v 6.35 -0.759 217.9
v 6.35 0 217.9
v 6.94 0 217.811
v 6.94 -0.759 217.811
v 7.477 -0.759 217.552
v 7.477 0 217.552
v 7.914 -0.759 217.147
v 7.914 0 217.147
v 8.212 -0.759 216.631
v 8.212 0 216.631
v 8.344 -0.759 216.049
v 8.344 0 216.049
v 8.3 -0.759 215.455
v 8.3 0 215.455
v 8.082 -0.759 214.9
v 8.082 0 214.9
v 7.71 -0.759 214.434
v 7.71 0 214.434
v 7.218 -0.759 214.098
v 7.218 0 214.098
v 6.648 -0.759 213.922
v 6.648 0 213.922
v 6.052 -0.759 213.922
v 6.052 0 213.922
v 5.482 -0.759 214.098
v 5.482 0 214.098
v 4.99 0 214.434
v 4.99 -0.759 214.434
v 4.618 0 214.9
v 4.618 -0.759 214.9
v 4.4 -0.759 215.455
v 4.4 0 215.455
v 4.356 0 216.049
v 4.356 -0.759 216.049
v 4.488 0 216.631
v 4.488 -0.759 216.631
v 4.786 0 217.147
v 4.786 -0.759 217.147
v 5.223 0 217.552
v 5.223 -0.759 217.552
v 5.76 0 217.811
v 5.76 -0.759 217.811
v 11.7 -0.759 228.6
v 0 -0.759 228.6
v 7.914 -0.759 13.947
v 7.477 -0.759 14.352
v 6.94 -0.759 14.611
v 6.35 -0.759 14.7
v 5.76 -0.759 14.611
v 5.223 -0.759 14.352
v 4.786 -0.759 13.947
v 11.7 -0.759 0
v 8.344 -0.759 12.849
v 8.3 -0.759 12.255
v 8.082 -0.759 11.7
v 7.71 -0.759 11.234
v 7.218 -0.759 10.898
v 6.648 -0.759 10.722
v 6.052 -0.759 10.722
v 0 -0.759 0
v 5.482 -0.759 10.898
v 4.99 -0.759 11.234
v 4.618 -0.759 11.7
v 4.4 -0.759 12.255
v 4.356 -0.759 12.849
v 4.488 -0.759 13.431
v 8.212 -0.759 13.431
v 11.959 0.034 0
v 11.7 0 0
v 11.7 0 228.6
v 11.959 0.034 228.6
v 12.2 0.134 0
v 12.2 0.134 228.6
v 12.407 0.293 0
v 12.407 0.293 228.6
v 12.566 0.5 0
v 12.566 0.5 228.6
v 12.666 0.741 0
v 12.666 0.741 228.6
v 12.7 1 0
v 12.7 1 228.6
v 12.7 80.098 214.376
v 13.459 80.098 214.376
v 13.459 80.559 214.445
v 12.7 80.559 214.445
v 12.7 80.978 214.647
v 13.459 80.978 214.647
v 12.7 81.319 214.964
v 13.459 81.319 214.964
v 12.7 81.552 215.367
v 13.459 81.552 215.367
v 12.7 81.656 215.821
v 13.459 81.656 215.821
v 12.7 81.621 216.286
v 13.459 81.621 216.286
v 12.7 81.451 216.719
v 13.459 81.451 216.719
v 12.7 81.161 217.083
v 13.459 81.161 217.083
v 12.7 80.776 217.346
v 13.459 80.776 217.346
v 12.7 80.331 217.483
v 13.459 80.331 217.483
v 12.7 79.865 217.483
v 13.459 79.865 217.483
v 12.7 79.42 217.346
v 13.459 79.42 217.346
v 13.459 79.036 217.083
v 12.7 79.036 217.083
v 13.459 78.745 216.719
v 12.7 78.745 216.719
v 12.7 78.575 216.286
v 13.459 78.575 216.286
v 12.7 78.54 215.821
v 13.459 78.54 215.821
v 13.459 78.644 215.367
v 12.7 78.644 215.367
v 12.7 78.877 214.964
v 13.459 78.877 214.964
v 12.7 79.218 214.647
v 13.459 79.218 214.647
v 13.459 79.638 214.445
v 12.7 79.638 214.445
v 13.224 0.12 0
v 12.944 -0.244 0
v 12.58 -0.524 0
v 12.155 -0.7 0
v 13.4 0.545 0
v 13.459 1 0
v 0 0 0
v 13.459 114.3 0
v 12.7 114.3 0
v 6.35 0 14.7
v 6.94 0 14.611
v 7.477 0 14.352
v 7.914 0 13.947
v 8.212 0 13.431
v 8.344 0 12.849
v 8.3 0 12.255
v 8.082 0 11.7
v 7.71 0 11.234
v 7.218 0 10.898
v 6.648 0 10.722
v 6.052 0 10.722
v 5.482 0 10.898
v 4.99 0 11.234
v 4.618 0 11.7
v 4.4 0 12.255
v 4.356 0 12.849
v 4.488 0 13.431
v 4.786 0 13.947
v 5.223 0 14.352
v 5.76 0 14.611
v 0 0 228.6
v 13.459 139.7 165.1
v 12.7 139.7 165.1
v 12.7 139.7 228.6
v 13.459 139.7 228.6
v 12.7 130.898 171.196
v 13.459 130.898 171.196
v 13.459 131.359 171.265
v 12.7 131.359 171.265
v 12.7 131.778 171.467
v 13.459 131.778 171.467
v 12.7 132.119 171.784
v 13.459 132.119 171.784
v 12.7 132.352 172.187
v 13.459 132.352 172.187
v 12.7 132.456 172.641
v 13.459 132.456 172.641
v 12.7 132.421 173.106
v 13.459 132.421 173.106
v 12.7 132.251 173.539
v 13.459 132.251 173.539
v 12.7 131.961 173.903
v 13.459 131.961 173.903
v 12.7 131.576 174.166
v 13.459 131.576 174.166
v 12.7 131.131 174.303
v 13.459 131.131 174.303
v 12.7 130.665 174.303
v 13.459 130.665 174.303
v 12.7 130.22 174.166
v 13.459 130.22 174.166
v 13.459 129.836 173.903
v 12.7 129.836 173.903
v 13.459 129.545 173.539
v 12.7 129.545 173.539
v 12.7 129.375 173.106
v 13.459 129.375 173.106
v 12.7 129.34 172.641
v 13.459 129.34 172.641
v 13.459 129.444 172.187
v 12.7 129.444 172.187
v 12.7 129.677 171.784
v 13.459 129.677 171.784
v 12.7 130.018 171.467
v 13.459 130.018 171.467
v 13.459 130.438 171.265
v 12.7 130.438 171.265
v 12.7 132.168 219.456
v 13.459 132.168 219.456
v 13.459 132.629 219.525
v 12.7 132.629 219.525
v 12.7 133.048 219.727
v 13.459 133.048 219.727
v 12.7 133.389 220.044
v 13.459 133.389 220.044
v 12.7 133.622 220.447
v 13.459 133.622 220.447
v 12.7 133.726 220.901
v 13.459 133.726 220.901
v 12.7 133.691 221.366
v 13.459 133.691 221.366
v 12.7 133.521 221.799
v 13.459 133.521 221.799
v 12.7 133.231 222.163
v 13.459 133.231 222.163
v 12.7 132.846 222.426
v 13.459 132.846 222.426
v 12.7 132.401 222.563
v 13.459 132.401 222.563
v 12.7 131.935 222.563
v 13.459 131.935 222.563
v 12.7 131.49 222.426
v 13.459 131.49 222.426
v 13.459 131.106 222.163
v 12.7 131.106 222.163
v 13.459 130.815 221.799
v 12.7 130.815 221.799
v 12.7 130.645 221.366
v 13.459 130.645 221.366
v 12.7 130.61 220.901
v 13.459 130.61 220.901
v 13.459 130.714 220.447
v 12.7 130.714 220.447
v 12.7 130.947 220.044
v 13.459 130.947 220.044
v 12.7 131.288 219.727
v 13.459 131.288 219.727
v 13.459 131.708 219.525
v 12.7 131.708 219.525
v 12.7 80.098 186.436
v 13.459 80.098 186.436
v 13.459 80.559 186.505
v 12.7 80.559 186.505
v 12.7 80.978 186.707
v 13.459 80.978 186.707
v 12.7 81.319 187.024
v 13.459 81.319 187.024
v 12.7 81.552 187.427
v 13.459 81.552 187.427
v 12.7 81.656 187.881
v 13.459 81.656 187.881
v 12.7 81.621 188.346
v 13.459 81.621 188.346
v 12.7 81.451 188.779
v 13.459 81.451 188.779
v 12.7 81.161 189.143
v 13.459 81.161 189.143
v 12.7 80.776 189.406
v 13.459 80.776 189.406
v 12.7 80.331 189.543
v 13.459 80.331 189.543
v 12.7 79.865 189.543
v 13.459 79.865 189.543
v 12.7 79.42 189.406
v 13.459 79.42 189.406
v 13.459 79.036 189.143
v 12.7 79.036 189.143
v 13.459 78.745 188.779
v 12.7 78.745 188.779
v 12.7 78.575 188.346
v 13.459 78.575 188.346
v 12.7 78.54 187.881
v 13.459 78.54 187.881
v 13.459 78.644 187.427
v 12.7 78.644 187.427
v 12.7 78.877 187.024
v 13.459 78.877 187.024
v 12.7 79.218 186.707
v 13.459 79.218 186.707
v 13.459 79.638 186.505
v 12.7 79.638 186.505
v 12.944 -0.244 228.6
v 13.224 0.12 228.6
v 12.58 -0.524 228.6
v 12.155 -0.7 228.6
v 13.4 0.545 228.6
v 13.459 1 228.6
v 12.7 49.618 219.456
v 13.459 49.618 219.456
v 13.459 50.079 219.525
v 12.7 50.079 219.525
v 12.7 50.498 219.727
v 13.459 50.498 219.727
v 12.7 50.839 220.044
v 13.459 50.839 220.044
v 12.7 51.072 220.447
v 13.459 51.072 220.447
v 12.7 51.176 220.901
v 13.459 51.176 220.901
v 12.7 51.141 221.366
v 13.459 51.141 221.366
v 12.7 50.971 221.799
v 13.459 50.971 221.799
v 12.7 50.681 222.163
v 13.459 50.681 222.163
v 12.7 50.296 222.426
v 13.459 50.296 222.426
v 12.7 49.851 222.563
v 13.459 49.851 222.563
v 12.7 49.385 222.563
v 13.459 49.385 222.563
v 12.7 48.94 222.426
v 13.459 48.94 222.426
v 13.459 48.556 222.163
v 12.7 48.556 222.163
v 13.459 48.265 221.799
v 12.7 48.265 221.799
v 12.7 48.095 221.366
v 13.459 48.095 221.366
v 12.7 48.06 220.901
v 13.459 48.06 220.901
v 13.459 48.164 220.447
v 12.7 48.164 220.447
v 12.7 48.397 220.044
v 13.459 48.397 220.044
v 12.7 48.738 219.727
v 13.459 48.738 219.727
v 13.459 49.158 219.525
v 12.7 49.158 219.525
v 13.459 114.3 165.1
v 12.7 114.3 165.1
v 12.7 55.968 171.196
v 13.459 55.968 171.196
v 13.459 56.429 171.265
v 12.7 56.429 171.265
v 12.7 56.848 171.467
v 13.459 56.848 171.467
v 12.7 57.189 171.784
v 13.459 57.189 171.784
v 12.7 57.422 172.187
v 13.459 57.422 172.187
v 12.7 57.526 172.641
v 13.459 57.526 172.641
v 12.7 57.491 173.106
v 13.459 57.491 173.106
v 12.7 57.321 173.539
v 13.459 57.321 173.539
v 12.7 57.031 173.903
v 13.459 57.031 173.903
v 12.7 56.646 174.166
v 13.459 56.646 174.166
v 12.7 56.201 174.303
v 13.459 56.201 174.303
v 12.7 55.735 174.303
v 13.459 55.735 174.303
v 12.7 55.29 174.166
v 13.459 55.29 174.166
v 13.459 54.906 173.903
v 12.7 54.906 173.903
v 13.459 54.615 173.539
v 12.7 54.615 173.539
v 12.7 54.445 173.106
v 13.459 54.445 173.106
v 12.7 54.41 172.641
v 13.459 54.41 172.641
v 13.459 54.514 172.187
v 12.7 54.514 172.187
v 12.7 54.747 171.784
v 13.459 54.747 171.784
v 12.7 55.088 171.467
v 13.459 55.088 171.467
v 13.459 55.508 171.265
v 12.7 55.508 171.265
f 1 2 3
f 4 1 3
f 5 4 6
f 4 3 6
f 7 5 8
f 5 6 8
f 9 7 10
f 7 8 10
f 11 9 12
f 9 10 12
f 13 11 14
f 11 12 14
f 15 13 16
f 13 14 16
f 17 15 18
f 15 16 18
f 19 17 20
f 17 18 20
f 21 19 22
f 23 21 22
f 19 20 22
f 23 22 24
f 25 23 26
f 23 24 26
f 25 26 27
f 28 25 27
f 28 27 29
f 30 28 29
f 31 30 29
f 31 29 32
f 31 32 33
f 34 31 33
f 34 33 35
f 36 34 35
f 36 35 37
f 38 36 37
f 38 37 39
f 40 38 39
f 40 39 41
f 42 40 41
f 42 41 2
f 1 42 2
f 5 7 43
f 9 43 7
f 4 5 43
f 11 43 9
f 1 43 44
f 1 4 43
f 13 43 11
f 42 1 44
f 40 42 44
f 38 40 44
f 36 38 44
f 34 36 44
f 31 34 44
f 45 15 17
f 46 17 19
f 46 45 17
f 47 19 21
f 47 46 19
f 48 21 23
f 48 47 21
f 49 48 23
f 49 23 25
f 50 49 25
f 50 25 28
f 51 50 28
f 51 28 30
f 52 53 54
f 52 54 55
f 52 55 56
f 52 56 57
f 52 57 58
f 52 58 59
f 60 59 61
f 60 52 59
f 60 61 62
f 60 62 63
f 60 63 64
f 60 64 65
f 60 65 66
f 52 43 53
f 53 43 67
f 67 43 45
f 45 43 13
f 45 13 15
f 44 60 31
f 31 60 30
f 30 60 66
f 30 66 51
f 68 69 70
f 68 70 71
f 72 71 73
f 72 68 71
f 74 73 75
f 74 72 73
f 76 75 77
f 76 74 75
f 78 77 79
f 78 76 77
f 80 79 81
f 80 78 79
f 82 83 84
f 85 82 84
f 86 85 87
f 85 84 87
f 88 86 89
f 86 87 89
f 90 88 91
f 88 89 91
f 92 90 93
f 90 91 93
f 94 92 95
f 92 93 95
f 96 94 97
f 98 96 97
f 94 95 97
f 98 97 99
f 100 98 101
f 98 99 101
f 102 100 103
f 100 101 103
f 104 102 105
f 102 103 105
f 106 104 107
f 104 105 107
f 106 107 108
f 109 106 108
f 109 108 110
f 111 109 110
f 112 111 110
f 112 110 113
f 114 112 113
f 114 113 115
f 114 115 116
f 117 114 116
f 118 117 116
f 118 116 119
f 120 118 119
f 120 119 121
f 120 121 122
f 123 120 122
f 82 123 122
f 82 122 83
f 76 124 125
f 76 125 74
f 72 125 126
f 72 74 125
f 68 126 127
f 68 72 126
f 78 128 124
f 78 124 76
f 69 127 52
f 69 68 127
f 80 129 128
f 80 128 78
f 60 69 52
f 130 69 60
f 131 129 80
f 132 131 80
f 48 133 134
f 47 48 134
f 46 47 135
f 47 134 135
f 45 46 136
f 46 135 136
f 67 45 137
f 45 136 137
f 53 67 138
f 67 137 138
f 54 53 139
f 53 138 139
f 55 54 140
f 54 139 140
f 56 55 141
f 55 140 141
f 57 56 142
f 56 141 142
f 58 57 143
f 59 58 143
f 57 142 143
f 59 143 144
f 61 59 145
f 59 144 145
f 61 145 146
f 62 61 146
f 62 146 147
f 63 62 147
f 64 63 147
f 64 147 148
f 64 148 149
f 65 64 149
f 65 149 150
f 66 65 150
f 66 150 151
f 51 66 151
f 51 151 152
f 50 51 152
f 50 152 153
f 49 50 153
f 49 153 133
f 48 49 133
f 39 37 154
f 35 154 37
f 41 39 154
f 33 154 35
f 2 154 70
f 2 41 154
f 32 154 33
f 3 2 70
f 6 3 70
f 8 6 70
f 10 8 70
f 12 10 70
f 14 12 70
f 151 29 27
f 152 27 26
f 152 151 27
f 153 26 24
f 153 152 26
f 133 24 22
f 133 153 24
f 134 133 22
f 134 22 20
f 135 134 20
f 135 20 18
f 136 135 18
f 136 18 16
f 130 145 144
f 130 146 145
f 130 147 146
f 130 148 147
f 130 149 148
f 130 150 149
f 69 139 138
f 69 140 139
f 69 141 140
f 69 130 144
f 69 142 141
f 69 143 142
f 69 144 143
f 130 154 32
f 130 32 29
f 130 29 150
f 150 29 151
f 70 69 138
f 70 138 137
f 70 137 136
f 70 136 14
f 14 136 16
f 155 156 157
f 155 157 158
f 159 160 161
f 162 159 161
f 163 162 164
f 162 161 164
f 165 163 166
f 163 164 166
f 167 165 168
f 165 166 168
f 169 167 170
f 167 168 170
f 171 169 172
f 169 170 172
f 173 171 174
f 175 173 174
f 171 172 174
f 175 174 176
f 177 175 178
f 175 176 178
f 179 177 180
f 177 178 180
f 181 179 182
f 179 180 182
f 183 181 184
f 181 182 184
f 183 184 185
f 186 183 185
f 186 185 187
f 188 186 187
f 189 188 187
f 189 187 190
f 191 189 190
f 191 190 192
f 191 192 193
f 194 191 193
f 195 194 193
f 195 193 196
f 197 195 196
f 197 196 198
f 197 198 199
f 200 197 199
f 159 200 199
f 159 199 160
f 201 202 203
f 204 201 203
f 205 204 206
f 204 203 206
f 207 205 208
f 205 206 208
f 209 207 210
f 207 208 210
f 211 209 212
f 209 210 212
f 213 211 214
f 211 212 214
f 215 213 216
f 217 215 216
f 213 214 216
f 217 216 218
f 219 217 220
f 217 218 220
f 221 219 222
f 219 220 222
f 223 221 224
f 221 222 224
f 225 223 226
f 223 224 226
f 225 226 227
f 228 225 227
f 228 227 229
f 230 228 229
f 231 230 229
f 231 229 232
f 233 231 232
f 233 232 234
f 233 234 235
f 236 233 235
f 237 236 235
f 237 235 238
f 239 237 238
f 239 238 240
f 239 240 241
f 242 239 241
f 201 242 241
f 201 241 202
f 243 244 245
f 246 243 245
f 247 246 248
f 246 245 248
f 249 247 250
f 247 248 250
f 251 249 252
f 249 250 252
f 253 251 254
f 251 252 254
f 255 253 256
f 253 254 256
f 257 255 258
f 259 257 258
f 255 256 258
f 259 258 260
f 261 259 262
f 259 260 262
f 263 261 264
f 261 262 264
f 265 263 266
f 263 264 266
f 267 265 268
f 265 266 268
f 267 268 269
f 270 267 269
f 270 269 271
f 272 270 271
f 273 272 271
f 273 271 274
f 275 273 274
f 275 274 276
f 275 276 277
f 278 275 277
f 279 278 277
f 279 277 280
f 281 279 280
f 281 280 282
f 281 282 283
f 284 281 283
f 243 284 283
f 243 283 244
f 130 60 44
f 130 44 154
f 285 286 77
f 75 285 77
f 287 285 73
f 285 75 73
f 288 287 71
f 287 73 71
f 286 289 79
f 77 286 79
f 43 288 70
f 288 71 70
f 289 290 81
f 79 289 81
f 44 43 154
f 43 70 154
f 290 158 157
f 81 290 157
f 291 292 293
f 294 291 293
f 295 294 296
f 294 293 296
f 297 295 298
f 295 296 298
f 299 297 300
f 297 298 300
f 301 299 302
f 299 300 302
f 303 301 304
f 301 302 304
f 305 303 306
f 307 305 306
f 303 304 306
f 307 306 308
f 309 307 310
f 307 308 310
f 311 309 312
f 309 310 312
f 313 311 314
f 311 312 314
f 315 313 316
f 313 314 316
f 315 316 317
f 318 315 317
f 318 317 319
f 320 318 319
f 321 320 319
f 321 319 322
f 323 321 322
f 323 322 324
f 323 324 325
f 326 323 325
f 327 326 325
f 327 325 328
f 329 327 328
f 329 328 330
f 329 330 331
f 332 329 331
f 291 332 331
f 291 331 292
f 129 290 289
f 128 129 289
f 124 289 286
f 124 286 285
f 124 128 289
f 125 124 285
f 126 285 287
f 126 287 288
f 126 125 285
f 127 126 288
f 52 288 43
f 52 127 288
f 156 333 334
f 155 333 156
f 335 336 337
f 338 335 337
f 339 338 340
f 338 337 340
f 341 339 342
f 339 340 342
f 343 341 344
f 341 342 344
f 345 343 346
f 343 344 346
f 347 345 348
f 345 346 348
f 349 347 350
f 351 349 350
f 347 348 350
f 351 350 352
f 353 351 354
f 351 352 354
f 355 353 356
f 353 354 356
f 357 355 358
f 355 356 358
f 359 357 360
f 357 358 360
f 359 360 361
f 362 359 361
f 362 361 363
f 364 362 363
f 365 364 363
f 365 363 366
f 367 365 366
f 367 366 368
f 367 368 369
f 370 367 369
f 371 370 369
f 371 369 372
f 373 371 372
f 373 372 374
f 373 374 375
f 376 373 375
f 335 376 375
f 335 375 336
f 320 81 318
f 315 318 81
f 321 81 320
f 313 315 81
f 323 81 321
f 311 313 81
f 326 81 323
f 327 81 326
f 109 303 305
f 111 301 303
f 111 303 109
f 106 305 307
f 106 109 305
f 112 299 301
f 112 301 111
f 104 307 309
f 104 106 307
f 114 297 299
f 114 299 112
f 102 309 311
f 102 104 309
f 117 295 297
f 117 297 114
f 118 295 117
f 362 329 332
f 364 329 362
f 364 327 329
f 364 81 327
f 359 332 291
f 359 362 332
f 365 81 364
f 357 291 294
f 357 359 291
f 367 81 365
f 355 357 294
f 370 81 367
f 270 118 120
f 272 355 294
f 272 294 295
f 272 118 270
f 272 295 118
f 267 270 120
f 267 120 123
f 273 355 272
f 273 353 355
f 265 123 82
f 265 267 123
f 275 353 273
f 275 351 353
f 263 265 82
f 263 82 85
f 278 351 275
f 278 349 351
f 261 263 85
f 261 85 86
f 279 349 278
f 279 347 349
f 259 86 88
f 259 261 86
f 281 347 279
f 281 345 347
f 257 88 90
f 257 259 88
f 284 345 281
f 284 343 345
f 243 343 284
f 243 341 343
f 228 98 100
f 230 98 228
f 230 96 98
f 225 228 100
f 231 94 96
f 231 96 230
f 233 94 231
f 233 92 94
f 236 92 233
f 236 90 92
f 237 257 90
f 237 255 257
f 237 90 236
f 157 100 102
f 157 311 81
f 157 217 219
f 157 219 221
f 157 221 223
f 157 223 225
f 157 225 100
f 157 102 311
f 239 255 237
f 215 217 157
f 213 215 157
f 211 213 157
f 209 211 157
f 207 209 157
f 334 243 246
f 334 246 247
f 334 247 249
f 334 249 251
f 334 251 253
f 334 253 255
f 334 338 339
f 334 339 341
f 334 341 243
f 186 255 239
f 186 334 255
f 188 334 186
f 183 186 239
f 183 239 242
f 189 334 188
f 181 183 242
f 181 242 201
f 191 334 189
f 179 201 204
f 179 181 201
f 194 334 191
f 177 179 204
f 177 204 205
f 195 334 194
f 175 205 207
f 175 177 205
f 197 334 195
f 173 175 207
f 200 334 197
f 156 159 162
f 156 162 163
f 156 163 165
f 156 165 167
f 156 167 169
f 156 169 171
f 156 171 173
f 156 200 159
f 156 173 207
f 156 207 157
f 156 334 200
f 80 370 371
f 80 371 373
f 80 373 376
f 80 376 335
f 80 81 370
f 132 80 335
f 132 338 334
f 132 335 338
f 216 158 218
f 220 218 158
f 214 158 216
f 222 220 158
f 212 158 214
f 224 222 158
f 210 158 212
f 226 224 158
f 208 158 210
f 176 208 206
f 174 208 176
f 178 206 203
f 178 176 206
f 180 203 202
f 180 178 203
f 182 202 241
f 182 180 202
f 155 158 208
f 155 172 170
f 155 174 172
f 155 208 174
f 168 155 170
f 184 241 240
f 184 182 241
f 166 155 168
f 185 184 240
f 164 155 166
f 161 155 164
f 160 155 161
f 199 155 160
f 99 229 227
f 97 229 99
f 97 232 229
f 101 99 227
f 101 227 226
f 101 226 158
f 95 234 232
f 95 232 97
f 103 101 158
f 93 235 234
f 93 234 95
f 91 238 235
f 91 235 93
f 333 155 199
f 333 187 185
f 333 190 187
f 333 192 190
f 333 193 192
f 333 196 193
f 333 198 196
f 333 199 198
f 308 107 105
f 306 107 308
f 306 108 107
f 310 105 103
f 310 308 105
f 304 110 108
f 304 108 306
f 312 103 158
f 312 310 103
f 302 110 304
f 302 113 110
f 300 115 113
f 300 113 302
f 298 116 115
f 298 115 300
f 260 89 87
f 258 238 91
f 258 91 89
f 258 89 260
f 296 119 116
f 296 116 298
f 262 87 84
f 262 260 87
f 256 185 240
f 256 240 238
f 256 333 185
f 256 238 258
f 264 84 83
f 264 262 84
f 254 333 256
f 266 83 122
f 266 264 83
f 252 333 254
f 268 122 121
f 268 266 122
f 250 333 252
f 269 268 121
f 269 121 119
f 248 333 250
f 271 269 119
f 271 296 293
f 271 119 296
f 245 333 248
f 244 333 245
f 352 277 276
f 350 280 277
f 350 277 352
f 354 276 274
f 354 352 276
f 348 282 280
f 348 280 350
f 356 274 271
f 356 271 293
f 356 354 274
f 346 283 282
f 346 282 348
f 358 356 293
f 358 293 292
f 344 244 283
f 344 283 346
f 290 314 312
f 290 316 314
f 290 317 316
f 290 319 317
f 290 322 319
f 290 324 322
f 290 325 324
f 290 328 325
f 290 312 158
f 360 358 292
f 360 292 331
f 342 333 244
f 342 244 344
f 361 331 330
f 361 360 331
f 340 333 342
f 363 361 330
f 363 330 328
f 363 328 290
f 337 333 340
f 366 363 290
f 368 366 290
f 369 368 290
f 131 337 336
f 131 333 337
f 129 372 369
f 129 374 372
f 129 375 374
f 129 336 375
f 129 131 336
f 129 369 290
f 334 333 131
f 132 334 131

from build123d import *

# Parameters (mm, degrees)
BASE_FLANGE1_DEPTH = 228.6
CUT_EXTRUDE1_REACH = 270.245
SKETCH4_W          = 165.1
SKETCH4_H          = 25.4
CUT_EXTRUDE2_REACH = 270.245
SKETCH6_R          = 2
SKETCH7_R          = 1.5621
CUT_EXTRUDE3_DEPTH = 269.244677605


# Sheet-metal steps are written as plain solids
with BuildPart() as part:
    # Sketch1 → Base-Flange1 (new body)
    with BuildSketch(Plane.XY):
        with BuildLine():
            Line((0, 0), (11.7, 0))
            ThreePointArc((11.7, 0), (12.407106781, 0.292893219), (12.7, 1))
            Line((12.7, 1), (12.7, 139.7))
            Line((12.7, 139.7), (13.45946, 139.7))
            Line((13.45946, 139.7), (13.45946, 1))
            ThreePointArc((13.45946, 1), (12.944126097, -0.244126097), (11.7, -0.75946))
            Line((11.7, -0.75946), (0, -0.75946))
            Line((0, -0.75946), (0, 0))
        make_face()
    extrude(amount=BASE_FLANGE1_DEPTH)

    # Sketch4 → Cut-Extrude1 (cut, up to next)
    with BuildSketch(Plane(origin=(13.45946, 0, 0), x_dir=(0, 0, -1), z_dir=(1, 0, 0)), mode=Mode.PRIVATE) as cut_extrude1_sk1:
        with Locations((-82.55, 127)):
            Rectangle(SKETCH4_W, SKETCH4_H)
    cut_extrude1_tool1 = extrude(cut_extrude1_sk1.sketch, amount=-CUT_EXTRUDE1_REACH, mode=Mode.PRIVATE) & part.part
    add(cut_extrude1_tool1.solids().sort_by_distance((13.45946, 127, 82.55))[0], mode=Mode.SUBTRACT)

    # Sketch6 → Cut-Extrude2 (cut, up to next)
    with BuildSketch(Plane(origin=(0, 0, 0), x_dir=(1, 0, 0), z_dir=(0, 1, 0)), mode=Mode.PRIVATE) as cut_extrude2_sk1:
        with Locations(Location((6.35, -12.7, 0), (0, 0, 270))):
            Circle(SKETCH6_R)
    cut_extrude2_tool1 = extrude(cut_extrude2_sk1.sketch, amount=-CUT_EXTRUDE2_REACH, mode=Mode.PRIVATE) & part.part
    # Sketch6 → Cut-Extrude2 (cut, up to next)
    with BuildSketch(Plane(origin=(0, 0, 0), x_dir=(1, 0, 0), z_dir=(0, 1, 0)), mode=Mode.PRIVATE) as cut_extrude2_sk2:
        with Locations(Location((6.35, -215.9, 0), (0, 0, 270))):
            Circle(SKETCH6_R)
    cut_extrude2_tool2 = extrude(cut_extrude2_sk2.sketch, amount=-CUT_EXTRUDE2_REACH, mode=Mode.PRIVATE) & part.part
    add(cut_extrude2_tool1.solids().sort_by_distance((6.35, 0, 12.7))[0], mode=Mode.SUBTRACT)
    add(cut_extrude2_tool2.solids().sort_by_distance((6.35, 0, 215.9))[0], mode=Mode.SUBTRACT)

    # Sketch7 → Cut-Extrude3 (cut, through all)
    with BuildSketch(Plane(origin=(13.45946, 0, 0), x_dir=(0, 0, -1), z_dir=(1, 0, 0))):
        with Locations((-221.0181, 49.61814)):
            Circle(SKETCH7_R)
        with Locations((-172.7581, 55.96814)):
            Circle(SKETCH7_R)
        with Locations((-215.9381, 80.09814)):
            Circle(SKETCH7_R)
        with Locations((-187.9981, 80.09814)):
            Circle(SKETCH7_R)
        with Locations((-221.0181, 132.16814)):
            Circle(SKETCH7_R)
        with Locations((-172.7581, 130.89814)):
            Circle(SKETCH7_R)
    extrude(amount=-CUT_EXTRUDE3_DEPTH, mode=Mode.SUBTRACT)


solid = part.part
